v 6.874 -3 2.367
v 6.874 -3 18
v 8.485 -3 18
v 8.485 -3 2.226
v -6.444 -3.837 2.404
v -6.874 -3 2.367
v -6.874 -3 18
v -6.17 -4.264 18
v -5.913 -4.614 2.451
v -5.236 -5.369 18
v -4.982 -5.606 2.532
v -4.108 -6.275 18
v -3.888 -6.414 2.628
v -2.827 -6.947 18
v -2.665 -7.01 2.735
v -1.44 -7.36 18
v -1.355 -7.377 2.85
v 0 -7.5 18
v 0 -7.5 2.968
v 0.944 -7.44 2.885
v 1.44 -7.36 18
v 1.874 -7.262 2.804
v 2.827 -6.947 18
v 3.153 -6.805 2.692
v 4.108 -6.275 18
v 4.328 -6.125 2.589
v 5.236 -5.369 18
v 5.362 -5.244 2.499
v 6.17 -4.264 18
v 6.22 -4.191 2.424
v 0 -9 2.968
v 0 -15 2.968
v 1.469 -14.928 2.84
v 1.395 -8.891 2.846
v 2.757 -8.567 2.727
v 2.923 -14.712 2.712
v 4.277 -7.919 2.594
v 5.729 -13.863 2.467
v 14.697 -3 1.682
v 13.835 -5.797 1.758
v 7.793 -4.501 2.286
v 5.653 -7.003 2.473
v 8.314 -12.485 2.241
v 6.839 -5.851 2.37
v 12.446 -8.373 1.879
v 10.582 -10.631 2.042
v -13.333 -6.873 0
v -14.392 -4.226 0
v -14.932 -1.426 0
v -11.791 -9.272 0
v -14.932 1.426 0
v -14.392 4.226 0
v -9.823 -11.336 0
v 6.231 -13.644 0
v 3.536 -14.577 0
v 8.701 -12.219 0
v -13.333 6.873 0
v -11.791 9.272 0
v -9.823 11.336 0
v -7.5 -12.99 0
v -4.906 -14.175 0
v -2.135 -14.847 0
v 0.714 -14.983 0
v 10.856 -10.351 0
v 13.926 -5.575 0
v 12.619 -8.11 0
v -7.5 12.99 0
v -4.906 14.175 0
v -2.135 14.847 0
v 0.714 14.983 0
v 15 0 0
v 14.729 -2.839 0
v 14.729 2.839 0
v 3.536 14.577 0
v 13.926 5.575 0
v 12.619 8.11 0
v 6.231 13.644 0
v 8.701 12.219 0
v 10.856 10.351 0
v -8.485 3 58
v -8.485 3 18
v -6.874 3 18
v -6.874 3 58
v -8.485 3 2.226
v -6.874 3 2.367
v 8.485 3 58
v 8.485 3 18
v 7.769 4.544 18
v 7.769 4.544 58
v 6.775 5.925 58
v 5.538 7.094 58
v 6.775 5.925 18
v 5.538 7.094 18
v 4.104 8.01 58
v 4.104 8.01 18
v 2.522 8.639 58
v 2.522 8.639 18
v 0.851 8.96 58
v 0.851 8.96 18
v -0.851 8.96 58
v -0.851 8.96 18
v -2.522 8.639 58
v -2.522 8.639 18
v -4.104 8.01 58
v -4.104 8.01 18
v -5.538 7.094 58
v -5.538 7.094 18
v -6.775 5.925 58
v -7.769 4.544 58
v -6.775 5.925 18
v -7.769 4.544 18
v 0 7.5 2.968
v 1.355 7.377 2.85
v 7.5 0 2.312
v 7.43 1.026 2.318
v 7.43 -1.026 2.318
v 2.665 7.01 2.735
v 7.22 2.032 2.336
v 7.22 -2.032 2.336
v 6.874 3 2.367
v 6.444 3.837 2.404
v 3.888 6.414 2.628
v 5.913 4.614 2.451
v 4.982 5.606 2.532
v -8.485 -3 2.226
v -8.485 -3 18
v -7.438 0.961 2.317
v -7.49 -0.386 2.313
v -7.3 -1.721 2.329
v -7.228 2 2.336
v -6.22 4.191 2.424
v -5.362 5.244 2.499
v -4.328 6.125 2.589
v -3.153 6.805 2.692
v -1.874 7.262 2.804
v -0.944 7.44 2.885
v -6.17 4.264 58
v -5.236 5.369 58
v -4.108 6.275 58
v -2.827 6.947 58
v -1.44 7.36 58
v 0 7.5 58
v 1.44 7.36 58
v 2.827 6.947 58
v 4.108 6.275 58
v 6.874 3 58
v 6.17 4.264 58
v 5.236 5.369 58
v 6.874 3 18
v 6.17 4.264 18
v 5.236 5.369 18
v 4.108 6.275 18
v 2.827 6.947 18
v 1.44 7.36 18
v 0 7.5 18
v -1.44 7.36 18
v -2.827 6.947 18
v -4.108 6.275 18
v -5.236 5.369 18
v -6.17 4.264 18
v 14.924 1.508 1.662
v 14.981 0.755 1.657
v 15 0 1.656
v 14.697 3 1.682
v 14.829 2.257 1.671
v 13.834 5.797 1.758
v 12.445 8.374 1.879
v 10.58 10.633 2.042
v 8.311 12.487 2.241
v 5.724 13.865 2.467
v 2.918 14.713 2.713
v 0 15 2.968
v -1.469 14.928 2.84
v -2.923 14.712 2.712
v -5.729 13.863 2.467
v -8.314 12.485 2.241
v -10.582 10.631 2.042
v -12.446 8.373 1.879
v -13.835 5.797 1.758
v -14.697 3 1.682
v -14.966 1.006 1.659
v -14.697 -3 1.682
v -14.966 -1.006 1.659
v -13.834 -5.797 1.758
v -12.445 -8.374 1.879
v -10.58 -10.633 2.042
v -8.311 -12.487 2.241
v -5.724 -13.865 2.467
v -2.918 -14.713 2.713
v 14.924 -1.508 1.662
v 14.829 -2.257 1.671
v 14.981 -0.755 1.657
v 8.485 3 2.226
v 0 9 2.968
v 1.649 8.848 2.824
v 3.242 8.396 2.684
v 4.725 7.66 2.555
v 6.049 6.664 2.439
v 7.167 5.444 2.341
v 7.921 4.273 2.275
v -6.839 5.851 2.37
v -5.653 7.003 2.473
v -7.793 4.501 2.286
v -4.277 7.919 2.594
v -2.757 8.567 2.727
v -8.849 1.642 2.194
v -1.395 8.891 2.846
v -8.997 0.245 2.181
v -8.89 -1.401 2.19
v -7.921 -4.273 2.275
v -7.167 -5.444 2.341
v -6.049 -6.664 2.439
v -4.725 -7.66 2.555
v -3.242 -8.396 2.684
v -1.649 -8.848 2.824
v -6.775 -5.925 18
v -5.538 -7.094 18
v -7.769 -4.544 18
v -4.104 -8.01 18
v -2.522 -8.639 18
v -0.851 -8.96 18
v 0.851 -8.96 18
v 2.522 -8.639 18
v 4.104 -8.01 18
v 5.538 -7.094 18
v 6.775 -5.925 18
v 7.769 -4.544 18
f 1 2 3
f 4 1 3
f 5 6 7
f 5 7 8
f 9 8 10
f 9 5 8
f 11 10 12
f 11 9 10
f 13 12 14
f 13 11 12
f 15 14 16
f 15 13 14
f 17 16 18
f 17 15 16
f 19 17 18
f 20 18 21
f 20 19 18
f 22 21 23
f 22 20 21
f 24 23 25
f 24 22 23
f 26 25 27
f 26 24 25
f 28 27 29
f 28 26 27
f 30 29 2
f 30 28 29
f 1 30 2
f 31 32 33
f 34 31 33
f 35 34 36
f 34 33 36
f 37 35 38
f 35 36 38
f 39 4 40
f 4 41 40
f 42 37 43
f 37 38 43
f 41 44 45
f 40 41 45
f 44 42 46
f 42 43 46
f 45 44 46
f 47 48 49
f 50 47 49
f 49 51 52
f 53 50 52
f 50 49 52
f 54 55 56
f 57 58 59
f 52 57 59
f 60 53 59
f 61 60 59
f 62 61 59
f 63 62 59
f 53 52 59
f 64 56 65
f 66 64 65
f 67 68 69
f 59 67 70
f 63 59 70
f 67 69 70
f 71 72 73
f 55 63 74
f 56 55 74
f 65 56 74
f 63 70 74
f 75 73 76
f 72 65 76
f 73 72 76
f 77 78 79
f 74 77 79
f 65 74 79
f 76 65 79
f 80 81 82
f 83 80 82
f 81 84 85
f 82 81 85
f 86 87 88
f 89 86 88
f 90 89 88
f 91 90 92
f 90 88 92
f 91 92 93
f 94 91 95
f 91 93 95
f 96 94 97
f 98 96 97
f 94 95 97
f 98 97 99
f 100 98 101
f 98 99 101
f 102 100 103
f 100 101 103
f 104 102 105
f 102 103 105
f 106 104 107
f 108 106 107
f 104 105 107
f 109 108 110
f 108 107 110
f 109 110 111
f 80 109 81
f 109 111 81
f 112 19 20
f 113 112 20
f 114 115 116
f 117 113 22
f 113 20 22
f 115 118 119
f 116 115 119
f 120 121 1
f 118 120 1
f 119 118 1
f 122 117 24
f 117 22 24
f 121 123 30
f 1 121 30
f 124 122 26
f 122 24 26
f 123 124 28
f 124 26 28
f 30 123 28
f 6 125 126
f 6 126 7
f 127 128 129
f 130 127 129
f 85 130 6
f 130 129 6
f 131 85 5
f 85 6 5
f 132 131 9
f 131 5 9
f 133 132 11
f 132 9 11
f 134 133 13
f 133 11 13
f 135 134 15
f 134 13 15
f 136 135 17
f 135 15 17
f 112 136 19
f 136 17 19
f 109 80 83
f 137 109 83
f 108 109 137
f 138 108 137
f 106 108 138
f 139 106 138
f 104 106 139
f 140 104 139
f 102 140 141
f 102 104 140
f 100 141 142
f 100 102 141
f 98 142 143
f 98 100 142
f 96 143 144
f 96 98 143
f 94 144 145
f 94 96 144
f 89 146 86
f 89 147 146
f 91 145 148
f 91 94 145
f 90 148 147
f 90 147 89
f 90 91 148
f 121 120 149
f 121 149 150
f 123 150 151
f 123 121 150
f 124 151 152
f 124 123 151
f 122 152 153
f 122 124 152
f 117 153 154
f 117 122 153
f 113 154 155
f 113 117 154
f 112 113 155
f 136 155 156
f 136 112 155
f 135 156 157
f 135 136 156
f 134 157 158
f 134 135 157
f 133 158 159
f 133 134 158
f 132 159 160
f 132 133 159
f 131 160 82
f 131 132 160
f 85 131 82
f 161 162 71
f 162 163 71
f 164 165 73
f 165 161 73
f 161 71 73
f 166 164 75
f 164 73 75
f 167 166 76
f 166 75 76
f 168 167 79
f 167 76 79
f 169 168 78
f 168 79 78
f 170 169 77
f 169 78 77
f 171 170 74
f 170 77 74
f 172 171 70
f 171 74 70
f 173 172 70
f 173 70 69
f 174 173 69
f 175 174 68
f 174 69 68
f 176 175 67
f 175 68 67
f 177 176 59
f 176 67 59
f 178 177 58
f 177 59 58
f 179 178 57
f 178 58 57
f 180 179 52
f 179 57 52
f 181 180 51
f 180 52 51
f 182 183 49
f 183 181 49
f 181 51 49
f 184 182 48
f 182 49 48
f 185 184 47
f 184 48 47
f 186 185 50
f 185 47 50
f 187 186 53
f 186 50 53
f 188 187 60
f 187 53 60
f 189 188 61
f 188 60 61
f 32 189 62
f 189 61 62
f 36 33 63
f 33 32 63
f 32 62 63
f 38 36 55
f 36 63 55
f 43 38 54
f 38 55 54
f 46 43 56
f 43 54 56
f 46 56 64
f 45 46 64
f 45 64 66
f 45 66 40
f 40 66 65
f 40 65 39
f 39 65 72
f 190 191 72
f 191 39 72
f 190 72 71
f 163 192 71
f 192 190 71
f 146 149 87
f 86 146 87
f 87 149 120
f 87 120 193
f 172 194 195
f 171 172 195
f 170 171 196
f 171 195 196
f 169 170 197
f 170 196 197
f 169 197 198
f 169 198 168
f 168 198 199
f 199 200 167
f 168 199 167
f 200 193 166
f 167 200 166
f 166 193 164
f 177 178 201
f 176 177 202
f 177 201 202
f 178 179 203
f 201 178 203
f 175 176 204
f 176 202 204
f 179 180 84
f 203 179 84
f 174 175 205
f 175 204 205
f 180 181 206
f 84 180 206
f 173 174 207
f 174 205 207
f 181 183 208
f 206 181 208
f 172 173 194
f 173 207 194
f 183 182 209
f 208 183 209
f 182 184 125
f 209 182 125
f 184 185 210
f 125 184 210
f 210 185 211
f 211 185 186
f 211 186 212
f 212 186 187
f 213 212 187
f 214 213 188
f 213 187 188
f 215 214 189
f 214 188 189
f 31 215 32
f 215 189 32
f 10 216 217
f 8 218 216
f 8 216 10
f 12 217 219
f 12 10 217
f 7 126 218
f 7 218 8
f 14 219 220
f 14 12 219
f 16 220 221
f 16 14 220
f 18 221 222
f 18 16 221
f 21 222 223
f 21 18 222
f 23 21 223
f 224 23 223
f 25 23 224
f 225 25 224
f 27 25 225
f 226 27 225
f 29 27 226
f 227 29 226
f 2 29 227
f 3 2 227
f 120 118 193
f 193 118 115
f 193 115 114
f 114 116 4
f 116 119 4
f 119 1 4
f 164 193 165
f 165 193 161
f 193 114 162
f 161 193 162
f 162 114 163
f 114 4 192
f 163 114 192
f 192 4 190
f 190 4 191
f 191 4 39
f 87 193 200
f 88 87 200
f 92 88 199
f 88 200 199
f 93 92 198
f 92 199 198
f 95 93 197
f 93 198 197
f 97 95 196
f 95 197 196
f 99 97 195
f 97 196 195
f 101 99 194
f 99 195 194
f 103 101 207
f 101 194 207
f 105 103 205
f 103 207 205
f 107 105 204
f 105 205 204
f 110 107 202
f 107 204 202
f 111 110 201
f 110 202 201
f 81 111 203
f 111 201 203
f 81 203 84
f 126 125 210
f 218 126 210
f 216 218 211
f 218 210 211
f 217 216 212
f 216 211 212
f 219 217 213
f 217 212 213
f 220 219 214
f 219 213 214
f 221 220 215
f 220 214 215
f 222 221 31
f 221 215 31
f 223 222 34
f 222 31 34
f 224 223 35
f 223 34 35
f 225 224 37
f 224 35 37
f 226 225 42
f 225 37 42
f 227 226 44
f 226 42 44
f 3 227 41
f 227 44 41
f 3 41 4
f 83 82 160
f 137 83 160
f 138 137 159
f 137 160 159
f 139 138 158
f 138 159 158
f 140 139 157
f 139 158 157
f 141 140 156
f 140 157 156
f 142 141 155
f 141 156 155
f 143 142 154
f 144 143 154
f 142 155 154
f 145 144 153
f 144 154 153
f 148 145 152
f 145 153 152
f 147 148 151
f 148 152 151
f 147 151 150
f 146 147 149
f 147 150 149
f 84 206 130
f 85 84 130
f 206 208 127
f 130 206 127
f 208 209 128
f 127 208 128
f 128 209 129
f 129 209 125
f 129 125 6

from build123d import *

# Parameters (mm, degrees)
F0_R     = 15
F1_DEPTH = 3
F3_DEPTH = 20
F4_R     = 9
F4_R_2   = 7.5
F5_DEPTH = 18
F7_DEPTH = 3
F9_DEPTH = 40


with BuildPart() as f1:
    # F0 (on Top) → F1 (new body)
    with BuildSketch(Plane.XY):
        Circle(F0_R)
    extrude(amount=F1_DEPTH)

    # F2 (on Front) → F3 (cut, symmetric)
    with BuildSketch(Plane.XZ):
        Polygon((-16.27984, 1.543784), (0, 2.968085), (16.030641, 1.565586), (16.030641, 3.755485), (-16.27984, 3.755485), align=None)
    extrude(amount=F3_DEPTH, both=True, mode=Mode.SUBTRACT)

    # F4 (on Top) → F5 (join)
    with BuildSketch(Plane.XY):
        Circle(F4_R)
        Circle(F4_R_2, mode=Mode.SUBTRACT)
    extrude(amount=F5_DEPTH)

    # F6 (on Front) → F7 (cut, symmetric)
    with BuildSketch(Plane.XZ):
        Polygon((16.263659, 20.495596), (-16.880802, 20.495596), (-16.596312, 1.516096), (0, 2.968085), (16.263659, 1.545199), align=None)
    extrude(amount=F7_DEPTH, both=True, mode=Mode.SUBTRACT)

    # F8 (on face) → F9 (join)
    with BuildSketch(Plane.XY.offset(18)):
        with BuildLine():
            Line((6.873864, 3), (8.485281, 3))
            ThreePointArc((8.485281, 3), (0, 9), (-8.485281, 3))
            Line((-8.485281, 3), (-6.873864, 3))
            ThreePointArc((-6.873864, 3), (0, 7.5), (6.873864, 3))
        make_face()
    extrude(amount=F9_DEPTH)


solid = f1.part
